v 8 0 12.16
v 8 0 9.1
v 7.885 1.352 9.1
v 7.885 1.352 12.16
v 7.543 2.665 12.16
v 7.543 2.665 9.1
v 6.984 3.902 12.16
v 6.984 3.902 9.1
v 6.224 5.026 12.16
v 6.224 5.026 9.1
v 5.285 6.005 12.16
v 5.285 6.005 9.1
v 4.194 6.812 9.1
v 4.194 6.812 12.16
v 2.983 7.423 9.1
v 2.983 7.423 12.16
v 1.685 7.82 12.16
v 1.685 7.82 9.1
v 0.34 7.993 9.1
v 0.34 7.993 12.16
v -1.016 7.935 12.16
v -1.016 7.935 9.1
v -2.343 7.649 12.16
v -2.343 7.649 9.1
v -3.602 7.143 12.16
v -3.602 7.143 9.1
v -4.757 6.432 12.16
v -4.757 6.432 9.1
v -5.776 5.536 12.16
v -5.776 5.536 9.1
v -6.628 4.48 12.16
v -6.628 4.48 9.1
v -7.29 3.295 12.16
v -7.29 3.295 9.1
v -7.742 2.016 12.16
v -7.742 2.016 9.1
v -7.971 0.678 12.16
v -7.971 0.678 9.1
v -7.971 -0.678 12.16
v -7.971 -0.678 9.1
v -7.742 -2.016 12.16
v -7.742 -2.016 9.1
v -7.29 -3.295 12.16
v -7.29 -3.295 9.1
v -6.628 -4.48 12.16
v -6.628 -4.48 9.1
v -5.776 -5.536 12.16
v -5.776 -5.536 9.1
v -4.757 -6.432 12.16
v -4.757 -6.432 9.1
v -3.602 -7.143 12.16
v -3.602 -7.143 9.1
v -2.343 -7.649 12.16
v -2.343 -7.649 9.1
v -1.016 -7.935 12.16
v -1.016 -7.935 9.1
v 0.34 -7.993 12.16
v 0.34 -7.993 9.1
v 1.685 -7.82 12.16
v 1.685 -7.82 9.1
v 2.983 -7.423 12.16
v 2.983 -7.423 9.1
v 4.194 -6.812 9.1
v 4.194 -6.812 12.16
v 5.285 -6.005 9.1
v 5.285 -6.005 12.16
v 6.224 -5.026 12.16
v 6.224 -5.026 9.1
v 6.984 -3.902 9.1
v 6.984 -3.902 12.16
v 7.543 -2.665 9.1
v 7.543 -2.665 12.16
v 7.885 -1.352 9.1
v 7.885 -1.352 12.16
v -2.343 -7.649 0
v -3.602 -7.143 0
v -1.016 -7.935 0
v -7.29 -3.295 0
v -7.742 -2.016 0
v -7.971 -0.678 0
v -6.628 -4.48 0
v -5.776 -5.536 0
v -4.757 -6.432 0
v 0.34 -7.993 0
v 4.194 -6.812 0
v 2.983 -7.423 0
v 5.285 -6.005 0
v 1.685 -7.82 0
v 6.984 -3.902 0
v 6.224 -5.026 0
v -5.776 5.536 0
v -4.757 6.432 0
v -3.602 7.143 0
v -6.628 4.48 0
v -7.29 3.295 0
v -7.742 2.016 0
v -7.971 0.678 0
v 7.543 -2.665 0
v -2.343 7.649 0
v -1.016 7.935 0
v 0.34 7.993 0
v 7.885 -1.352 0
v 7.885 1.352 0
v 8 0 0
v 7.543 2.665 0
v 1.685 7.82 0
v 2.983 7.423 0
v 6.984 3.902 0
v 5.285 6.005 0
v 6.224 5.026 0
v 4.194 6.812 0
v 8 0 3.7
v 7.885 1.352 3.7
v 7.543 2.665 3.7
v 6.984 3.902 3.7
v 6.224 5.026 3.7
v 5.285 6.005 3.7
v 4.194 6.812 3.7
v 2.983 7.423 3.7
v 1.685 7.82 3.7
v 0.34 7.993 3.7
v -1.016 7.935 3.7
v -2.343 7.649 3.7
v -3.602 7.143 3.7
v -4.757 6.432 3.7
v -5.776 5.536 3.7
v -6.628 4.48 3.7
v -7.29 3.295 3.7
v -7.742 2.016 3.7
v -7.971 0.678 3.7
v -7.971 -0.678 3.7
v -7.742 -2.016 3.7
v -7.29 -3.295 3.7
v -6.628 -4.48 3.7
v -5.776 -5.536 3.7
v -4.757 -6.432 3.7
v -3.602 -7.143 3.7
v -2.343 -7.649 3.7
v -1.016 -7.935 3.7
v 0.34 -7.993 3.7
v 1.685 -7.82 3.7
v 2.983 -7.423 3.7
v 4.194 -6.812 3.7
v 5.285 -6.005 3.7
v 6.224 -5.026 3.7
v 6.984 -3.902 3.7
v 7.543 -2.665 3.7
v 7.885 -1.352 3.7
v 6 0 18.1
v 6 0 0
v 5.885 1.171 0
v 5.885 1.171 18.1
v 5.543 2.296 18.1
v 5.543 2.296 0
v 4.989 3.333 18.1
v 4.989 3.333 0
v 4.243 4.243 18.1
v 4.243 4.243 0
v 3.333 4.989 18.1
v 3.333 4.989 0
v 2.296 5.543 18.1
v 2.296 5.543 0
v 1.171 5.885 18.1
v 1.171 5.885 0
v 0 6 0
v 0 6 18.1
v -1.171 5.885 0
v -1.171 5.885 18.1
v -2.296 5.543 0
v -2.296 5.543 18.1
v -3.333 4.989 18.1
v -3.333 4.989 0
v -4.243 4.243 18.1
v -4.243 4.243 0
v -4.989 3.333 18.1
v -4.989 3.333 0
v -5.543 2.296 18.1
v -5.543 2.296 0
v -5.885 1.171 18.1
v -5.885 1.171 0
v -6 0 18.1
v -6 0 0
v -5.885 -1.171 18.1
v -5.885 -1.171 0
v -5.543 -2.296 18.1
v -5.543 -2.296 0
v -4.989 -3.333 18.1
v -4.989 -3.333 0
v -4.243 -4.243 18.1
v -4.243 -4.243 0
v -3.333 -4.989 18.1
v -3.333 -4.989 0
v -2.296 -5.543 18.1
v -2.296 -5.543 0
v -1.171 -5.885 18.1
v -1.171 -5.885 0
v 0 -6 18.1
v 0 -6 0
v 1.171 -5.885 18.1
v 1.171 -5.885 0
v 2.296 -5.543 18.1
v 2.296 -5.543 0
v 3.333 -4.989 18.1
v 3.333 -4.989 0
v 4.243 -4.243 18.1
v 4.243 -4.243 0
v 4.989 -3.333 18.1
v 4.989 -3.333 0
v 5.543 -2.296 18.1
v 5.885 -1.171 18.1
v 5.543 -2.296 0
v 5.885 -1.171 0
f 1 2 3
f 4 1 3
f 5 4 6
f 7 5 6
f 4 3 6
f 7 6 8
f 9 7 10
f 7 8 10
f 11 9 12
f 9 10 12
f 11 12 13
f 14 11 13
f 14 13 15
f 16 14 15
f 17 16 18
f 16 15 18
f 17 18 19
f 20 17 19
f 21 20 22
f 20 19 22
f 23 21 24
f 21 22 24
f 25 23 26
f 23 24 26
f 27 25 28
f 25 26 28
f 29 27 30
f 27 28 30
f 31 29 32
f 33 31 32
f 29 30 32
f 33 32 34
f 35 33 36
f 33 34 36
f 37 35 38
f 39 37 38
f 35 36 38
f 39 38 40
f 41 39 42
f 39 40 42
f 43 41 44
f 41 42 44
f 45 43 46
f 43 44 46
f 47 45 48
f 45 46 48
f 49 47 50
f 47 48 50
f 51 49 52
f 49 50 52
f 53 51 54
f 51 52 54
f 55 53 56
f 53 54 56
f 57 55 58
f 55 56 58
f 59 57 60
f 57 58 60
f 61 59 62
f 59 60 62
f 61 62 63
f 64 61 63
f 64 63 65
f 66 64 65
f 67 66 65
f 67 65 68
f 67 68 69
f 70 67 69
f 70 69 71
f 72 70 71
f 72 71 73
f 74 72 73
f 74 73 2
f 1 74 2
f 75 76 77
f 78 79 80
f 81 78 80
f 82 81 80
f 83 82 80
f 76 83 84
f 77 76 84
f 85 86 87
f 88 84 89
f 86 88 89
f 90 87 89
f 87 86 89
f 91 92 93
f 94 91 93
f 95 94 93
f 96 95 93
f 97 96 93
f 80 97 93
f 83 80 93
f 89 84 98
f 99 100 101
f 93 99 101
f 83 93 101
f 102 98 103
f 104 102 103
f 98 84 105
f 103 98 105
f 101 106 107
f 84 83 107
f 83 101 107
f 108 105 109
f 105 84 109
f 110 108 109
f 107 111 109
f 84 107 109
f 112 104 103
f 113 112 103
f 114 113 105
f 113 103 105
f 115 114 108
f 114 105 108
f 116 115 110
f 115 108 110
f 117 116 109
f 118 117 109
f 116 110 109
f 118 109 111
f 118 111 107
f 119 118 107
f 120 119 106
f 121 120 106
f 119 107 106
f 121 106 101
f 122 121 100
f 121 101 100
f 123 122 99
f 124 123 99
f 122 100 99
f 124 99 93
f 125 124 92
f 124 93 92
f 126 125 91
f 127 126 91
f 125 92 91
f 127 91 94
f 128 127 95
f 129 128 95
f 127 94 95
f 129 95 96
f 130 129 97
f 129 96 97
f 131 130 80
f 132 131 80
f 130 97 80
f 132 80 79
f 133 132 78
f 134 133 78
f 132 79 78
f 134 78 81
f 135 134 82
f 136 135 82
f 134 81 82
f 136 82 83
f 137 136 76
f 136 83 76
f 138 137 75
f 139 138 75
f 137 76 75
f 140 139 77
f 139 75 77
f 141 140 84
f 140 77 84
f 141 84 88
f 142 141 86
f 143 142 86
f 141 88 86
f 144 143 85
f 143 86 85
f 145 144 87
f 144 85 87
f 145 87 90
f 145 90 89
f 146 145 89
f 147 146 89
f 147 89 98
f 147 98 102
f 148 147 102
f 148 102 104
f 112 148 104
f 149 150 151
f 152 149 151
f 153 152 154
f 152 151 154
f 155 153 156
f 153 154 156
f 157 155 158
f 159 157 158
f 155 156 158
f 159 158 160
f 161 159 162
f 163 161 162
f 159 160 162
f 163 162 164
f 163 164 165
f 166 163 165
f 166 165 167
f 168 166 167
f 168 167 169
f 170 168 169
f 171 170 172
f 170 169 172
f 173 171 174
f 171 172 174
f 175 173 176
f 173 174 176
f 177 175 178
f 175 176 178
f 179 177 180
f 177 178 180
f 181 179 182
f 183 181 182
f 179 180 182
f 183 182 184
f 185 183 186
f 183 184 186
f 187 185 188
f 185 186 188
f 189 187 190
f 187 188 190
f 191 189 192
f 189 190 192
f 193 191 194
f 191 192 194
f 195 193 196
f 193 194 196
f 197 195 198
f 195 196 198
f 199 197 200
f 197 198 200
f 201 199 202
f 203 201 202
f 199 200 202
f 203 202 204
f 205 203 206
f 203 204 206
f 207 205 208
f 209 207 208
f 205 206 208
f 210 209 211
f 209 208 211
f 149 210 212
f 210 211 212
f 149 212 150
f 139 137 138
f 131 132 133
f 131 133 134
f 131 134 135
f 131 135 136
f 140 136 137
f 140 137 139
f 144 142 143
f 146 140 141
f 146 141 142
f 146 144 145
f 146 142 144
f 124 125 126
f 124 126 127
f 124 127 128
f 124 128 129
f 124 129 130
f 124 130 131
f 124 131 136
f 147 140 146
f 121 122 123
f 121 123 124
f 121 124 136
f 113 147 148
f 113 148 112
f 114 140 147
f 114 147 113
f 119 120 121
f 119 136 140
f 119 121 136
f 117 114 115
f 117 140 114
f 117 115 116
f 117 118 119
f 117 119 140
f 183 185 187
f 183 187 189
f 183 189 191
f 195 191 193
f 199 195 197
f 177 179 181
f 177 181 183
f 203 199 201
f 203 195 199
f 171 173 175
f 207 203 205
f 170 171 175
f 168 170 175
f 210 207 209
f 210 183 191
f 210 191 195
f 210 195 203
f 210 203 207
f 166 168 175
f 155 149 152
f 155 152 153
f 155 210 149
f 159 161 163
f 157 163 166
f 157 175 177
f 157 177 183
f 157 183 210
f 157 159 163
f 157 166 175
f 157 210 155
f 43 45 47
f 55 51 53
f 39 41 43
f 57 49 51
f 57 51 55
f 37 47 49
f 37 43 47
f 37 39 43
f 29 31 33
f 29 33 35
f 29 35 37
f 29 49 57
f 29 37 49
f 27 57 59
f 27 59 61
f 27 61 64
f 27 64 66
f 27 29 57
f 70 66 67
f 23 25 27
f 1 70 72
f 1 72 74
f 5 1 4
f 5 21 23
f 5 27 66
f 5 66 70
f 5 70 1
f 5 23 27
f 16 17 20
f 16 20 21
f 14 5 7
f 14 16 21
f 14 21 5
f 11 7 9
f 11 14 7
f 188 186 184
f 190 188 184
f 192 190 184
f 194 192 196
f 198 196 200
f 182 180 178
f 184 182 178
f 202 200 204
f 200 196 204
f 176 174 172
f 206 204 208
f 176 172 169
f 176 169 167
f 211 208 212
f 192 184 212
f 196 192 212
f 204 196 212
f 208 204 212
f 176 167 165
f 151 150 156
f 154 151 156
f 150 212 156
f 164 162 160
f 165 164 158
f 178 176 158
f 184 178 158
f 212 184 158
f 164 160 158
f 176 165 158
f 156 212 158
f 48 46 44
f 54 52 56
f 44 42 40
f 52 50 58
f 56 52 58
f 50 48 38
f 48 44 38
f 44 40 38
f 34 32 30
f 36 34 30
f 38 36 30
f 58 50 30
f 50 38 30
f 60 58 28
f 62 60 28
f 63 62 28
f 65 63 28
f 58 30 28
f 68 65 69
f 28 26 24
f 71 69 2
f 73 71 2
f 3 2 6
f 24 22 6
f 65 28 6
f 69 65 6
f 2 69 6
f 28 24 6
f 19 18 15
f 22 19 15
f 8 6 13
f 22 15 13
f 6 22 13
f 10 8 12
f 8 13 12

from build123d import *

# Parameters (mm, degrees)
CYLINDER_R        = 8
CYLINDER_DEPTH    = 3.7
CYLINDER001_R     = 8
CYLINDER001_DEPTH = 3.06
CYLINDER002_R     = 6
CYLINDER002_DEPTH = 18.1


with BuildPart() as cilindro:
    # Cylinder → Cylinder (new body)
    with BuildSketch(Plane.XY):
        Circle(CYLINDER_R)
    extrude(amount=CYLINDER_DEPTH)


with BuildPart() as cilindro002:
    # Cylinder001 → Cylinder001 (new body)
    with BuildSketch(Plane(origin=(0, -5e-06, 9.1), x_dir=(1, 0, 0), z_dir=(0, 0, 1))):
        Circle(CYLINDER001_R)
    extrude(amount=CYLINDER001_DEPTH)


with BuildPart() as cilindro001:
    # Cylinder002 → Cylinder002 (new body)
    with BuildSketch(Plane.XY):
        Circle(CYLINDER002_R)
    extrude(amount=CYLINDER002_DEPTH)


solid = Compound([cilindro.part, cilindro002.part, cilindro001.part])
